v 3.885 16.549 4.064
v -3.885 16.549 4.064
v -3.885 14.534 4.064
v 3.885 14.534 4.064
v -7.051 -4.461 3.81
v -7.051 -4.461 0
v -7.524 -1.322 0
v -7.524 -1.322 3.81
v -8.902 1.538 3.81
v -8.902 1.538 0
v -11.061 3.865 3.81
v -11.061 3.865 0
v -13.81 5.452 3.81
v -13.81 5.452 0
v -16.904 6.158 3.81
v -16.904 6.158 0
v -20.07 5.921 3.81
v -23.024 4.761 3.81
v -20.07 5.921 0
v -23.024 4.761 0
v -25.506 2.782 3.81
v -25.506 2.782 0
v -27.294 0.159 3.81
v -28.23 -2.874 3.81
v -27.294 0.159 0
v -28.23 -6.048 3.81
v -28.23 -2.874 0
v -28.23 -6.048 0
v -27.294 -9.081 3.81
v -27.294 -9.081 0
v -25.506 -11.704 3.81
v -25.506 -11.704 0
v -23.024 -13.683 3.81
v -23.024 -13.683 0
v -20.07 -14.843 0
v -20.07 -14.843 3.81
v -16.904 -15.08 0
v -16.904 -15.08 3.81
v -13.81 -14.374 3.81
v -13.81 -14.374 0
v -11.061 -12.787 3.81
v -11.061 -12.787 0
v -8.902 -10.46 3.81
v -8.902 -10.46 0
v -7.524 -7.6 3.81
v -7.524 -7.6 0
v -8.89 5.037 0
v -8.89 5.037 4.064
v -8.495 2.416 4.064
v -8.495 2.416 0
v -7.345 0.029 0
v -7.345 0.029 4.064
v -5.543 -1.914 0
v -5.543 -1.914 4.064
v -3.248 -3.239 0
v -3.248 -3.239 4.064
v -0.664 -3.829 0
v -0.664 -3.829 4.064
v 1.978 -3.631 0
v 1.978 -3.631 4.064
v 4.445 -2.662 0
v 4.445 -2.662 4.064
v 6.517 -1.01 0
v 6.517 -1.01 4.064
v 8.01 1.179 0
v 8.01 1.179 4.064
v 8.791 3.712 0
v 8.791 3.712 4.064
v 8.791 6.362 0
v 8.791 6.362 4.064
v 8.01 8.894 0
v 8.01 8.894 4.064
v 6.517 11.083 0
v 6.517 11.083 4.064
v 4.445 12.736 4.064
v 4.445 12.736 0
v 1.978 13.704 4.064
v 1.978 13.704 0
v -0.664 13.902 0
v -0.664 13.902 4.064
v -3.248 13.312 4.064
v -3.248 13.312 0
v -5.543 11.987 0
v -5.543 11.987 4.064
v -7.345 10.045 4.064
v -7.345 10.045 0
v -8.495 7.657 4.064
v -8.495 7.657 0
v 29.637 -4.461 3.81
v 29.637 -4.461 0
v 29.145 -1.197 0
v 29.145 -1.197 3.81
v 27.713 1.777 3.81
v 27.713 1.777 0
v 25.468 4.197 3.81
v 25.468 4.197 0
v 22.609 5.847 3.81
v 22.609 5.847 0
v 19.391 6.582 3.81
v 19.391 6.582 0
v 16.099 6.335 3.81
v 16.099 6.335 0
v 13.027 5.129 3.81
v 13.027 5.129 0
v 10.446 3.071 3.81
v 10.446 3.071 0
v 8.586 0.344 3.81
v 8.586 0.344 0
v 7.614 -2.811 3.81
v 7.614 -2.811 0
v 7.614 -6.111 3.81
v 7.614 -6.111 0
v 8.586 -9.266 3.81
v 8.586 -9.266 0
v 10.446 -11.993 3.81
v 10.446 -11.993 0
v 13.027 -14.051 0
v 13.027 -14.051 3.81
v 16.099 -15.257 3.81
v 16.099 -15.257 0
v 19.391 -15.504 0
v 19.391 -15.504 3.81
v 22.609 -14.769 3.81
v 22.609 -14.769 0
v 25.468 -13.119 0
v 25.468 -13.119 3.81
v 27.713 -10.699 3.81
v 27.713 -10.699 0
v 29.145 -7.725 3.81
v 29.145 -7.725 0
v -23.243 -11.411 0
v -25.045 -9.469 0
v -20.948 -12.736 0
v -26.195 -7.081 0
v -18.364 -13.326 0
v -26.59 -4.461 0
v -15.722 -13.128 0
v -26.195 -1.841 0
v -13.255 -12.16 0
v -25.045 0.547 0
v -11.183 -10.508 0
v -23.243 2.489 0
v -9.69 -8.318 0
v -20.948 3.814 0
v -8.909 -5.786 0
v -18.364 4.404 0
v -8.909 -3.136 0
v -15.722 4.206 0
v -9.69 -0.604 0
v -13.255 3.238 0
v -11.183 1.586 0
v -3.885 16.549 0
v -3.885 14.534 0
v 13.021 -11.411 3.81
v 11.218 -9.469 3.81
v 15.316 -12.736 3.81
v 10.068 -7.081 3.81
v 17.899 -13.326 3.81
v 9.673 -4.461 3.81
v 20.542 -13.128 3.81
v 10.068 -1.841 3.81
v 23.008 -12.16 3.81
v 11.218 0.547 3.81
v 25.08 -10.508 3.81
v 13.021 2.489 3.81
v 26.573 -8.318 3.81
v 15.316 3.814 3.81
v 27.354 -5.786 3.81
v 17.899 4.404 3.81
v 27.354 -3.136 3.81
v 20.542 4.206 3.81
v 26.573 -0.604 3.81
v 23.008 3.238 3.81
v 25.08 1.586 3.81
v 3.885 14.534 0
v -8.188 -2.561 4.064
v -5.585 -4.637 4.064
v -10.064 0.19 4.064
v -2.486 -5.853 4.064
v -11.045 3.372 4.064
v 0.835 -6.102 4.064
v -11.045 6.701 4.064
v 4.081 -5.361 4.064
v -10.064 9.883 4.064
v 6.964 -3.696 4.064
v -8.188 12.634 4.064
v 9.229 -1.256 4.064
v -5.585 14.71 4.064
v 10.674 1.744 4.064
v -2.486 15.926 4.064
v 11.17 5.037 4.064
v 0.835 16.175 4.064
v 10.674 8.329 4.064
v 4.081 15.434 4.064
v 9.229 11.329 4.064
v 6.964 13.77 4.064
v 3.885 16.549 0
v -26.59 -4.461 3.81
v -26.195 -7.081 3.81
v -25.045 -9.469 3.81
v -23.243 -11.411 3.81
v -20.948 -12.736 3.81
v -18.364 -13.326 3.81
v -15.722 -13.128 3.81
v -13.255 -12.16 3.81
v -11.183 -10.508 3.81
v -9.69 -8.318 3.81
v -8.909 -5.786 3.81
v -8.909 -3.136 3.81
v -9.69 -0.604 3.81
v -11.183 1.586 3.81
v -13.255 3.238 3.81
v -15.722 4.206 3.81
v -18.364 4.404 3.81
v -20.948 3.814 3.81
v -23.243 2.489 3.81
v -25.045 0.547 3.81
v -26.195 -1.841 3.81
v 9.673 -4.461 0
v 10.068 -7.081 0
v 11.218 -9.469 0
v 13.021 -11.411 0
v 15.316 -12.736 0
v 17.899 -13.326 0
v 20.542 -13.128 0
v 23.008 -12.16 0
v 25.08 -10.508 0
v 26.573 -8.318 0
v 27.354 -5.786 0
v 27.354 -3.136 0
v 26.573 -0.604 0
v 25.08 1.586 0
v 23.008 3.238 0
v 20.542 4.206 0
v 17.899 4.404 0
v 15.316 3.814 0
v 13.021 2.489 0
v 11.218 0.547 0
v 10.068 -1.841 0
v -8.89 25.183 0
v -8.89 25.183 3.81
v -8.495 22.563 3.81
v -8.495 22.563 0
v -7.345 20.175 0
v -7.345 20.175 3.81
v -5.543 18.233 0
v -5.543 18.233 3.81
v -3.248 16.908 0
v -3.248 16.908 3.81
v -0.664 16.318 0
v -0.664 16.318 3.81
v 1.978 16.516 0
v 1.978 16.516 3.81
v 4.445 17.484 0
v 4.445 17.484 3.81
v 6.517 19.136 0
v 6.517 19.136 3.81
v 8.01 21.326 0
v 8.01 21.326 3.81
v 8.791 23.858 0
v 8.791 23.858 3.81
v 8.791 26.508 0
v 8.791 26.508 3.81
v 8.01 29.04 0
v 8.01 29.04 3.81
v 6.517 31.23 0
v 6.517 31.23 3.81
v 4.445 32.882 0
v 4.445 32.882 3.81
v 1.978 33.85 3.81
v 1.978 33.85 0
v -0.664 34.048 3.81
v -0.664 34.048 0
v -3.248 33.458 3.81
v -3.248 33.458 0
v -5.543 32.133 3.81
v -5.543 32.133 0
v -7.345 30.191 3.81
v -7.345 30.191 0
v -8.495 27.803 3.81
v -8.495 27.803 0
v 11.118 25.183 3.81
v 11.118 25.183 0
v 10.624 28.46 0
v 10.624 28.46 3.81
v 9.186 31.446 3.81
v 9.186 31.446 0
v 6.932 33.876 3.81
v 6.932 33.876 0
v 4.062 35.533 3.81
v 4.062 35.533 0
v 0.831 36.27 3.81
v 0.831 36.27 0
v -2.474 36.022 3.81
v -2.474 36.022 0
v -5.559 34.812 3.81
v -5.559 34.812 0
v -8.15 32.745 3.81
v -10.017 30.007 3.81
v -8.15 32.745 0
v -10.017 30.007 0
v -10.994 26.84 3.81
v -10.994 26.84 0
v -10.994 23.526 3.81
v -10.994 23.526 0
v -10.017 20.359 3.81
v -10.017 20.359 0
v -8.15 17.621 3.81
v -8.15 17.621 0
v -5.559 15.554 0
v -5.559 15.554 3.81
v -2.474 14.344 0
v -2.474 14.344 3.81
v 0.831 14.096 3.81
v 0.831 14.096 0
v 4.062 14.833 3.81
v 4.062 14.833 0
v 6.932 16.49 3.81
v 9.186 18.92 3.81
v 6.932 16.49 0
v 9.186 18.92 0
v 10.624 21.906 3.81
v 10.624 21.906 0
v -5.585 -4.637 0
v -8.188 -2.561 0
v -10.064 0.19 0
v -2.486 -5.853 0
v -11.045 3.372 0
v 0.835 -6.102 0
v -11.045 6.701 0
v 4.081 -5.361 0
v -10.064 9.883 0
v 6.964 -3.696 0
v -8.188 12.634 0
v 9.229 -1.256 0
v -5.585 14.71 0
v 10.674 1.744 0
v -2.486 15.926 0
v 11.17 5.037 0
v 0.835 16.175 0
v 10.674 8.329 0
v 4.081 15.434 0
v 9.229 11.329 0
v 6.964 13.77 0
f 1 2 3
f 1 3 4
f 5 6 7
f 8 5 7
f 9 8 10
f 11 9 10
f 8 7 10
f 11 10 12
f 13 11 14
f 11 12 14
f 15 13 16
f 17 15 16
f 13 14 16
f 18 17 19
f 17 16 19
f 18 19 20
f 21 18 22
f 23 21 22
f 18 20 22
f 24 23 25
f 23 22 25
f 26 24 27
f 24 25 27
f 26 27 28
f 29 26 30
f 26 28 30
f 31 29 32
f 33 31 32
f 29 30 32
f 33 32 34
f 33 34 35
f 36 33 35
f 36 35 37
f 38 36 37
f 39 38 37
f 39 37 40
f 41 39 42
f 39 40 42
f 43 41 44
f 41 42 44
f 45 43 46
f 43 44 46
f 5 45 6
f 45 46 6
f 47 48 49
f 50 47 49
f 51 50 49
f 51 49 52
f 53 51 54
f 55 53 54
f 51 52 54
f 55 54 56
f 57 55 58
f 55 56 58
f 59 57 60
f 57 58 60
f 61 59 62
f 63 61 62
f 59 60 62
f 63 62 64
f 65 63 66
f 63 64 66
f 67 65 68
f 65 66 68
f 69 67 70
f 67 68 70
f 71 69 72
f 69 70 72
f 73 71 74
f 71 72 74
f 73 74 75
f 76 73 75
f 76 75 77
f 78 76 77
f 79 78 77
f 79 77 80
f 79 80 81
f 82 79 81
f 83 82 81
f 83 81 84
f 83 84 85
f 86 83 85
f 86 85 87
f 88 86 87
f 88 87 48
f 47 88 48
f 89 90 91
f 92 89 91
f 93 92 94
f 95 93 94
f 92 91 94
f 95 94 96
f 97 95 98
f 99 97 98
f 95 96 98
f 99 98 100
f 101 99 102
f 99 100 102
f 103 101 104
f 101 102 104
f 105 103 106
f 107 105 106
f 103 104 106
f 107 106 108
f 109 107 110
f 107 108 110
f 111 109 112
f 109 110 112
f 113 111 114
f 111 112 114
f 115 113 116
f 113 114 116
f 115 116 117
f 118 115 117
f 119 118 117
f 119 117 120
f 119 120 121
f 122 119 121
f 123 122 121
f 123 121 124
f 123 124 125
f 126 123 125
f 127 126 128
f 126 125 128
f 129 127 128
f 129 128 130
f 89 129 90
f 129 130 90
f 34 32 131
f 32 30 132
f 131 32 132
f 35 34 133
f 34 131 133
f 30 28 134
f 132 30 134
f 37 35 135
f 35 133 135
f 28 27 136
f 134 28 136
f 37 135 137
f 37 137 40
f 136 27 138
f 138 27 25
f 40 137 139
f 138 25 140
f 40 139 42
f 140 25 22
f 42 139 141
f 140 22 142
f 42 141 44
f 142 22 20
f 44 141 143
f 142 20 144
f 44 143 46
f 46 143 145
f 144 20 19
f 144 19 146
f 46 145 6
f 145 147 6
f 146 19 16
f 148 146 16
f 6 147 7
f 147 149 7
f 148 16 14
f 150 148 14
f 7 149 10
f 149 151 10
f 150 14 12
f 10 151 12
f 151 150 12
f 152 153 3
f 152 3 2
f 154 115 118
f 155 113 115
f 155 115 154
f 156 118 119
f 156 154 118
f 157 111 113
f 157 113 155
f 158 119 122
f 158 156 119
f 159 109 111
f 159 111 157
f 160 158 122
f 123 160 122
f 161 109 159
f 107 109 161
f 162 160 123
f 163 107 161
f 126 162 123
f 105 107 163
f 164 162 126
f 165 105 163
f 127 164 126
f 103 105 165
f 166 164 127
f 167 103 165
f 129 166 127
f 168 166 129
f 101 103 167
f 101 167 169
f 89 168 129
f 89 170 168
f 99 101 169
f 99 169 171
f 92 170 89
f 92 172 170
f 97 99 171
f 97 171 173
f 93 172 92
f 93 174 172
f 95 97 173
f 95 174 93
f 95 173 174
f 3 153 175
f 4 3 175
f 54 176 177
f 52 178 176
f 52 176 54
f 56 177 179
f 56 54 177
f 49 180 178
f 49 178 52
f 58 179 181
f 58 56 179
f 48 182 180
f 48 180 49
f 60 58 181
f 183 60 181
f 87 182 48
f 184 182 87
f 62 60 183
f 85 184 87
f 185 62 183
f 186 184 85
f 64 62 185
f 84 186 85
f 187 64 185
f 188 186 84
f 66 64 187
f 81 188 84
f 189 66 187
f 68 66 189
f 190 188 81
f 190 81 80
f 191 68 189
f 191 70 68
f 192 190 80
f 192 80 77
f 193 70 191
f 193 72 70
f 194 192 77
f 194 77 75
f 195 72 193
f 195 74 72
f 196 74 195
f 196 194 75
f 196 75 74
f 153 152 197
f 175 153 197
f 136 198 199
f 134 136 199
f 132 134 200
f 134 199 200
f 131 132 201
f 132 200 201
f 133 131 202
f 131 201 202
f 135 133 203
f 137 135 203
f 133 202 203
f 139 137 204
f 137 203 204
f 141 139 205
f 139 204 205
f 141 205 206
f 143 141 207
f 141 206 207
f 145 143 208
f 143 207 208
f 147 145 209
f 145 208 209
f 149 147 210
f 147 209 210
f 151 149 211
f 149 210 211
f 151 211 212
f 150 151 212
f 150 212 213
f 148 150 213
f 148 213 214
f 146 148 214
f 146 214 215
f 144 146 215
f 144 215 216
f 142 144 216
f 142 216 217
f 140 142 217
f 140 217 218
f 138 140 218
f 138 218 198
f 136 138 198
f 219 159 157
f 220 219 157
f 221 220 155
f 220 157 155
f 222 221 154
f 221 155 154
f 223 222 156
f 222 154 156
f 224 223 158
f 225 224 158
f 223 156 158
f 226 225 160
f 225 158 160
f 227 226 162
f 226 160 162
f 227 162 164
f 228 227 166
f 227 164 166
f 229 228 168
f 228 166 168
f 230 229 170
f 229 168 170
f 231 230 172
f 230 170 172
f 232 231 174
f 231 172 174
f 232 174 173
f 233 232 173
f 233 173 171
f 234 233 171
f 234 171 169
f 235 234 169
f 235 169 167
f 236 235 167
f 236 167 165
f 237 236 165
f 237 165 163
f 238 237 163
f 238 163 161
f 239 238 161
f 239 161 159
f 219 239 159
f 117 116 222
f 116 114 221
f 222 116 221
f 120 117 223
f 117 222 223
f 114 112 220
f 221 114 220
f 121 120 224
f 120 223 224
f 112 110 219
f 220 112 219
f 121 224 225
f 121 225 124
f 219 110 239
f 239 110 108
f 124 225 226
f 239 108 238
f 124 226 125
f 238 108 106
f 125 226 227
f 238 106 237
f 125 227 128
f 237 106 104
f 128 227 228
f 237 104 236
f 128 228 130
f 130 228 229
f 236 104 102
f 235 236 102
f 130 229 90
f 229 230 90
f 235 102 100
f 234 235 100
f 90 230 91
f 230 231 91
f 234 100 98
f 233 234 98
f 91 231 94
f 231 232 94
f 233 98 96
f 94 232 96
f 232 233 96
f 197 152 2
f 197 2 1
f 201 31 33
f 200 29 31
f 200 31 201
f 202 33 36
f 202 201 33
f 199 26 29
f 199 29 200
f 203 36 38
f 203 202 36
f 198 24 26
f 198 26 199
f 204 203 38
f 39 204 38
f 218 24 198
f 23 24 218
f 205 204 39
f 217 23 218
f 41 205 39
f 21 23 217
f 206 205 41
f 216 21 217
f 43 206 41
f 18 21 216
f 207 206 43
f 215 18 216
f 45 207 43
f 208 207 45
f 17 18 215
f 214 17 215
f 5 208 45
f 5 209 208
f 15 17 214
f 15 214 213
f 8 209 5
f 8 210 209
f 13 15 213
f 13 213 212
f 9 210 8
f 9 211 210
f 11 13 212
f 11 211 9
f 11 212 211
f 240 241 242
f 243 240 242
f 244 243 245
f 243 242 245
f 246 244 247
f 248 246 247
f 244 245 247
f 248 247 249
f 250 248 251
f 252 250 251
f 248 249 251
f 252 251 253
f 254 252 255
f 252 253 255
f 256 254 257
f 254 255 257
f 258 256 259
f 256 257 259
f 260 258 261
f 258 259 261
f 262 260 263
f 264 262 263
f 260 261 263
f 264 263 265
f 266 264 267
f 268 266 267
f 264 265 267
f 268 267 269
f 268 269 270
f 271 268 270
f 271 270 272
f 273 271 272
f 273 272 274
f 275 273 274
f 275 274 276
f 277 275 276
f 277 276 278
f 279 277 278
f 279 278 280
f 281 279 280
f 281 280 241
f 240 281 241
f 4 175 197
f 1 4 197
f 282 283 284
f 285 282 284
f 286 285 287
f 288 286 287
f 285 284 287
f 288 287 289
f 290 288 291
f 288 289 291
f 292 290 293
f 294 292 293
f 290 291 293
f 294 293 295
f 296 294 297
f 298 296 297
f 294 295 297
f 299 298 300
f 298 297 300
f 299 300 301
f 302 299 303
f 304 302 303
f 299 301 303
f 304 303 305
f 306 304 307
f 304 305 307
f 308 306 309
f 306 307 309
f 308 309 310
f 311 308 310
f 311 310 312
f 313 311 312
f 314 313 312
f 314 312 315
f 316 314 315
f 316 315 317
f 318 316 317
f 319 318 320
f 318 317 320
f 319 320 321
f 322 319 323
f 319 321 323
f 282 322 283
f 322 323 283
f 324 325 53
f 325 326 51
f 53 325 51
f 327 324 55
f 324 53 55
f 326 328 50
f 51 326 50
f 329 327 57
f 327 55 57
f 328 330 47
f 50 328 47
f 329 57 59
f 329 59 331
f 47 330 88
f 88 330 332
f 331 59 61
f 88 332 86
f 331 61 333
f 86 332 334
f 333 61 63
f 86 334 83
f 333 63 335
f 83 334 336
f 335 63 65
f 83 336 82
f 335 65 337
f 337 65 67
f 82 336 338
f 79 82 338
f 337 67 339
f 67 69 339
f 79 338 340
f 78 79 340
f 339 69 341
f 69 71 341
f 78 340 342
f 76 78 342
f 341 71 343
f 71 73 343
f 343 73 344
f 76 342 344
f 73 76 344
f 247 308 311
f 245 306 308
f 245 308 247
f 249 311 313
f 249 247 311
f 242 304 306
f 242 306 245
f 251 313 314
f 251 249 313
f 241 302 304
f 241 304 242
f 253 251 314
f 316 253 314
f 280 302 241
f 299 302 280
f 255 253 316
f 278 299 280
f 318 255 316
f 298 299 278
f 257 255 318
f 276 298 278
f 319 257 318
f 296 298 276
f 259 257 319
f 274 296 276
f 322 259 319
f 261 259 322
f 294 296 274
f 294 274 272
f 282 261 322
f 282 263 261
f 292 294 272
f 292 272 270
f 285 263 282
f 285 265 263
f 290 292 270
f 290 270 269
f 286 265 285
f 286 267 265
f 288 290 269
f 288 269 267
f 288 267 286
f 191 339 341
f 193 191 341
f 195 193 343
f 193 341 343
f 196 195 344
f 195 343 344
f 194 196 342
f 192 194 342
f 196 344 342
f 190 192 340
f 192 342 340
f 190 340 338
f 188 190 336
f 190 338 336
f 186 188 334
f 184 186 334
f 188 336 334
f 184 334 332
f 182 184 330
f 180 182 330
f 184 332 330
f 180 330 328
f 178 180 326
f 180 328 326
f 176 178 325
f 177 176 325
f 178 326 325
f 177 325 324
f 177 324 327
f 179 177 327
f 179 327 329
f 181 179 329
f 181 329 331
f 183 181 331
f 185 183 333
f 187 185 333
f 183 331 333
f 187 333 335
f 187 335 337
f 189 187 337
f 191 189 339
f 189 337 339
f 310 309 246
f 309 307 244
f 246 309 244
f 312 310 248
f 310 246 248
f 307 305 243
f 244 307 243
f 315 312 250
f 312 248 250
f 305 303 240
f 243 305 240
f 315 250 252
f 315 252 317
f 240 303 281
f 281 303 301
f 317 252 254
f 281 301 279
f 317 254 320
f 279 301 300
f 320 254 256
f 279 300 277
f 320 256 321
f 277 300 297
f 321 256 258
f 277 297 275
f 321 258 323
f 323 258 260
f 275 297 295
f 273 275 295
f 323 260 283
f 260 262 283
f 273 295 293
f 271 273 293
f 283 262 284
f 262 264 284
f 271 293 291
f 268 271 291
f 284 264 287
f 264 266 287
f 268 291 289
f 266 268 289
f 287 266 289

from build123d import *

# Parameters (mm, degrees)
F0_R     = 11.1182295212
F1_DEPTH = 3.81
F0_R_2   = 10.6488108635
F0_R_3   = 11.0736272213
F2_D     = 17.78
F2_2_D   = 17.78
F2_3_D   = 17.78
F3_R     = 11.1698672286
F4_DEPTH = 4.064
F5_D     = 17.78
F6_W     = 7.7707553282
F6_H     = 2.0146397874
F7_DEPTH = 4.064


with BuildPart() as f1:
    # F0 (on Top) → F1 (new body)
    with BuildSketch(Plane.XY):
        with Locations((0, 25.1830033958)):
            Circle(F0_R)
    extrude(amount=F1_DEPTH)

    # F2 (through all)
    with Locations(Plane(origin=(0, 0, 0), x_dir=(1, 0, 0), z_dir=(0, 0, -1))):
        with Locations((0, -25.1830033958), (-17.7000537515, 4.4609890319), (18.5634717345, 4.4609890319)):
            Hole(F2_D / 2)


with BuildPart() as f1b:
    # F0 (on Top) → F1, piece 2 (new body)
    with BuildSketch(Plane.XY):
        with Locations((-17.7000537515, -4.4609890319)):
            Circle(F0_R_2)
    extrude(amount=F1_DEPTH)

    # F2#2 (through all)
    with Locations(Plane(origin=(0, 0, 0), x_dir=(1, 0, 0), z_dir=(0, 0, -1))):
        with Locations((0, -25.1830033958), (-17.7000537515, 4.4609890319), (18.5634717345, 4.4609890319)):
            Hole(F2_2_D / 2)


with BuildPart() as f1c:
    # F0 (on Top) → F1, piece 3 (new body)
    with BuildSketch(Plane.XY):
        with Locations((18.5634717345, -4.4609890319)):
            Circle(F0_R_3)
    extrude(amount=F1_DEPTH)

    # F2#3 (through all)
    with Locations(Plane(origin=(0, 0, 0), x_dir=(1, 0, 0), z_dir=(0, 0, -1))):
        with Locations((0, -25.1830033958), (-17.7000537515, 4.4609890319), (18.5634717345, 4.4609890319)):
            Hole(F2_3_D / 2)


with BuildPart() as f4:
    # F3 (on Top) → F4 (new body)
    with BuildSketch(Plane.XY):
        with Locations((0, 5.0366008654)):
            Circle(F3_R)
    extrude(amount=F4_DEPTH)

    # F5 (through all)
    with Locations(Plane(origin=(0, 0, 0), x_dir=(1, 0, 0), z_dir=(0, 0, -1))):
        with Locations((0, -5.0366008654)):
            Hole(F5_D / 2)


with BuildPart() as f7:
    # F6 (on Top) → F7 (new body)
    with BuildSketch(Plane.XY):
        with Locations((0, 15.5415111221)):
            Rectangle(F6_W, F6_H)
    extrude(amount=F7_DEPTH)


solid = Compound([f1.part, f1b.part, f1c.part, f4.part, f7.part])
